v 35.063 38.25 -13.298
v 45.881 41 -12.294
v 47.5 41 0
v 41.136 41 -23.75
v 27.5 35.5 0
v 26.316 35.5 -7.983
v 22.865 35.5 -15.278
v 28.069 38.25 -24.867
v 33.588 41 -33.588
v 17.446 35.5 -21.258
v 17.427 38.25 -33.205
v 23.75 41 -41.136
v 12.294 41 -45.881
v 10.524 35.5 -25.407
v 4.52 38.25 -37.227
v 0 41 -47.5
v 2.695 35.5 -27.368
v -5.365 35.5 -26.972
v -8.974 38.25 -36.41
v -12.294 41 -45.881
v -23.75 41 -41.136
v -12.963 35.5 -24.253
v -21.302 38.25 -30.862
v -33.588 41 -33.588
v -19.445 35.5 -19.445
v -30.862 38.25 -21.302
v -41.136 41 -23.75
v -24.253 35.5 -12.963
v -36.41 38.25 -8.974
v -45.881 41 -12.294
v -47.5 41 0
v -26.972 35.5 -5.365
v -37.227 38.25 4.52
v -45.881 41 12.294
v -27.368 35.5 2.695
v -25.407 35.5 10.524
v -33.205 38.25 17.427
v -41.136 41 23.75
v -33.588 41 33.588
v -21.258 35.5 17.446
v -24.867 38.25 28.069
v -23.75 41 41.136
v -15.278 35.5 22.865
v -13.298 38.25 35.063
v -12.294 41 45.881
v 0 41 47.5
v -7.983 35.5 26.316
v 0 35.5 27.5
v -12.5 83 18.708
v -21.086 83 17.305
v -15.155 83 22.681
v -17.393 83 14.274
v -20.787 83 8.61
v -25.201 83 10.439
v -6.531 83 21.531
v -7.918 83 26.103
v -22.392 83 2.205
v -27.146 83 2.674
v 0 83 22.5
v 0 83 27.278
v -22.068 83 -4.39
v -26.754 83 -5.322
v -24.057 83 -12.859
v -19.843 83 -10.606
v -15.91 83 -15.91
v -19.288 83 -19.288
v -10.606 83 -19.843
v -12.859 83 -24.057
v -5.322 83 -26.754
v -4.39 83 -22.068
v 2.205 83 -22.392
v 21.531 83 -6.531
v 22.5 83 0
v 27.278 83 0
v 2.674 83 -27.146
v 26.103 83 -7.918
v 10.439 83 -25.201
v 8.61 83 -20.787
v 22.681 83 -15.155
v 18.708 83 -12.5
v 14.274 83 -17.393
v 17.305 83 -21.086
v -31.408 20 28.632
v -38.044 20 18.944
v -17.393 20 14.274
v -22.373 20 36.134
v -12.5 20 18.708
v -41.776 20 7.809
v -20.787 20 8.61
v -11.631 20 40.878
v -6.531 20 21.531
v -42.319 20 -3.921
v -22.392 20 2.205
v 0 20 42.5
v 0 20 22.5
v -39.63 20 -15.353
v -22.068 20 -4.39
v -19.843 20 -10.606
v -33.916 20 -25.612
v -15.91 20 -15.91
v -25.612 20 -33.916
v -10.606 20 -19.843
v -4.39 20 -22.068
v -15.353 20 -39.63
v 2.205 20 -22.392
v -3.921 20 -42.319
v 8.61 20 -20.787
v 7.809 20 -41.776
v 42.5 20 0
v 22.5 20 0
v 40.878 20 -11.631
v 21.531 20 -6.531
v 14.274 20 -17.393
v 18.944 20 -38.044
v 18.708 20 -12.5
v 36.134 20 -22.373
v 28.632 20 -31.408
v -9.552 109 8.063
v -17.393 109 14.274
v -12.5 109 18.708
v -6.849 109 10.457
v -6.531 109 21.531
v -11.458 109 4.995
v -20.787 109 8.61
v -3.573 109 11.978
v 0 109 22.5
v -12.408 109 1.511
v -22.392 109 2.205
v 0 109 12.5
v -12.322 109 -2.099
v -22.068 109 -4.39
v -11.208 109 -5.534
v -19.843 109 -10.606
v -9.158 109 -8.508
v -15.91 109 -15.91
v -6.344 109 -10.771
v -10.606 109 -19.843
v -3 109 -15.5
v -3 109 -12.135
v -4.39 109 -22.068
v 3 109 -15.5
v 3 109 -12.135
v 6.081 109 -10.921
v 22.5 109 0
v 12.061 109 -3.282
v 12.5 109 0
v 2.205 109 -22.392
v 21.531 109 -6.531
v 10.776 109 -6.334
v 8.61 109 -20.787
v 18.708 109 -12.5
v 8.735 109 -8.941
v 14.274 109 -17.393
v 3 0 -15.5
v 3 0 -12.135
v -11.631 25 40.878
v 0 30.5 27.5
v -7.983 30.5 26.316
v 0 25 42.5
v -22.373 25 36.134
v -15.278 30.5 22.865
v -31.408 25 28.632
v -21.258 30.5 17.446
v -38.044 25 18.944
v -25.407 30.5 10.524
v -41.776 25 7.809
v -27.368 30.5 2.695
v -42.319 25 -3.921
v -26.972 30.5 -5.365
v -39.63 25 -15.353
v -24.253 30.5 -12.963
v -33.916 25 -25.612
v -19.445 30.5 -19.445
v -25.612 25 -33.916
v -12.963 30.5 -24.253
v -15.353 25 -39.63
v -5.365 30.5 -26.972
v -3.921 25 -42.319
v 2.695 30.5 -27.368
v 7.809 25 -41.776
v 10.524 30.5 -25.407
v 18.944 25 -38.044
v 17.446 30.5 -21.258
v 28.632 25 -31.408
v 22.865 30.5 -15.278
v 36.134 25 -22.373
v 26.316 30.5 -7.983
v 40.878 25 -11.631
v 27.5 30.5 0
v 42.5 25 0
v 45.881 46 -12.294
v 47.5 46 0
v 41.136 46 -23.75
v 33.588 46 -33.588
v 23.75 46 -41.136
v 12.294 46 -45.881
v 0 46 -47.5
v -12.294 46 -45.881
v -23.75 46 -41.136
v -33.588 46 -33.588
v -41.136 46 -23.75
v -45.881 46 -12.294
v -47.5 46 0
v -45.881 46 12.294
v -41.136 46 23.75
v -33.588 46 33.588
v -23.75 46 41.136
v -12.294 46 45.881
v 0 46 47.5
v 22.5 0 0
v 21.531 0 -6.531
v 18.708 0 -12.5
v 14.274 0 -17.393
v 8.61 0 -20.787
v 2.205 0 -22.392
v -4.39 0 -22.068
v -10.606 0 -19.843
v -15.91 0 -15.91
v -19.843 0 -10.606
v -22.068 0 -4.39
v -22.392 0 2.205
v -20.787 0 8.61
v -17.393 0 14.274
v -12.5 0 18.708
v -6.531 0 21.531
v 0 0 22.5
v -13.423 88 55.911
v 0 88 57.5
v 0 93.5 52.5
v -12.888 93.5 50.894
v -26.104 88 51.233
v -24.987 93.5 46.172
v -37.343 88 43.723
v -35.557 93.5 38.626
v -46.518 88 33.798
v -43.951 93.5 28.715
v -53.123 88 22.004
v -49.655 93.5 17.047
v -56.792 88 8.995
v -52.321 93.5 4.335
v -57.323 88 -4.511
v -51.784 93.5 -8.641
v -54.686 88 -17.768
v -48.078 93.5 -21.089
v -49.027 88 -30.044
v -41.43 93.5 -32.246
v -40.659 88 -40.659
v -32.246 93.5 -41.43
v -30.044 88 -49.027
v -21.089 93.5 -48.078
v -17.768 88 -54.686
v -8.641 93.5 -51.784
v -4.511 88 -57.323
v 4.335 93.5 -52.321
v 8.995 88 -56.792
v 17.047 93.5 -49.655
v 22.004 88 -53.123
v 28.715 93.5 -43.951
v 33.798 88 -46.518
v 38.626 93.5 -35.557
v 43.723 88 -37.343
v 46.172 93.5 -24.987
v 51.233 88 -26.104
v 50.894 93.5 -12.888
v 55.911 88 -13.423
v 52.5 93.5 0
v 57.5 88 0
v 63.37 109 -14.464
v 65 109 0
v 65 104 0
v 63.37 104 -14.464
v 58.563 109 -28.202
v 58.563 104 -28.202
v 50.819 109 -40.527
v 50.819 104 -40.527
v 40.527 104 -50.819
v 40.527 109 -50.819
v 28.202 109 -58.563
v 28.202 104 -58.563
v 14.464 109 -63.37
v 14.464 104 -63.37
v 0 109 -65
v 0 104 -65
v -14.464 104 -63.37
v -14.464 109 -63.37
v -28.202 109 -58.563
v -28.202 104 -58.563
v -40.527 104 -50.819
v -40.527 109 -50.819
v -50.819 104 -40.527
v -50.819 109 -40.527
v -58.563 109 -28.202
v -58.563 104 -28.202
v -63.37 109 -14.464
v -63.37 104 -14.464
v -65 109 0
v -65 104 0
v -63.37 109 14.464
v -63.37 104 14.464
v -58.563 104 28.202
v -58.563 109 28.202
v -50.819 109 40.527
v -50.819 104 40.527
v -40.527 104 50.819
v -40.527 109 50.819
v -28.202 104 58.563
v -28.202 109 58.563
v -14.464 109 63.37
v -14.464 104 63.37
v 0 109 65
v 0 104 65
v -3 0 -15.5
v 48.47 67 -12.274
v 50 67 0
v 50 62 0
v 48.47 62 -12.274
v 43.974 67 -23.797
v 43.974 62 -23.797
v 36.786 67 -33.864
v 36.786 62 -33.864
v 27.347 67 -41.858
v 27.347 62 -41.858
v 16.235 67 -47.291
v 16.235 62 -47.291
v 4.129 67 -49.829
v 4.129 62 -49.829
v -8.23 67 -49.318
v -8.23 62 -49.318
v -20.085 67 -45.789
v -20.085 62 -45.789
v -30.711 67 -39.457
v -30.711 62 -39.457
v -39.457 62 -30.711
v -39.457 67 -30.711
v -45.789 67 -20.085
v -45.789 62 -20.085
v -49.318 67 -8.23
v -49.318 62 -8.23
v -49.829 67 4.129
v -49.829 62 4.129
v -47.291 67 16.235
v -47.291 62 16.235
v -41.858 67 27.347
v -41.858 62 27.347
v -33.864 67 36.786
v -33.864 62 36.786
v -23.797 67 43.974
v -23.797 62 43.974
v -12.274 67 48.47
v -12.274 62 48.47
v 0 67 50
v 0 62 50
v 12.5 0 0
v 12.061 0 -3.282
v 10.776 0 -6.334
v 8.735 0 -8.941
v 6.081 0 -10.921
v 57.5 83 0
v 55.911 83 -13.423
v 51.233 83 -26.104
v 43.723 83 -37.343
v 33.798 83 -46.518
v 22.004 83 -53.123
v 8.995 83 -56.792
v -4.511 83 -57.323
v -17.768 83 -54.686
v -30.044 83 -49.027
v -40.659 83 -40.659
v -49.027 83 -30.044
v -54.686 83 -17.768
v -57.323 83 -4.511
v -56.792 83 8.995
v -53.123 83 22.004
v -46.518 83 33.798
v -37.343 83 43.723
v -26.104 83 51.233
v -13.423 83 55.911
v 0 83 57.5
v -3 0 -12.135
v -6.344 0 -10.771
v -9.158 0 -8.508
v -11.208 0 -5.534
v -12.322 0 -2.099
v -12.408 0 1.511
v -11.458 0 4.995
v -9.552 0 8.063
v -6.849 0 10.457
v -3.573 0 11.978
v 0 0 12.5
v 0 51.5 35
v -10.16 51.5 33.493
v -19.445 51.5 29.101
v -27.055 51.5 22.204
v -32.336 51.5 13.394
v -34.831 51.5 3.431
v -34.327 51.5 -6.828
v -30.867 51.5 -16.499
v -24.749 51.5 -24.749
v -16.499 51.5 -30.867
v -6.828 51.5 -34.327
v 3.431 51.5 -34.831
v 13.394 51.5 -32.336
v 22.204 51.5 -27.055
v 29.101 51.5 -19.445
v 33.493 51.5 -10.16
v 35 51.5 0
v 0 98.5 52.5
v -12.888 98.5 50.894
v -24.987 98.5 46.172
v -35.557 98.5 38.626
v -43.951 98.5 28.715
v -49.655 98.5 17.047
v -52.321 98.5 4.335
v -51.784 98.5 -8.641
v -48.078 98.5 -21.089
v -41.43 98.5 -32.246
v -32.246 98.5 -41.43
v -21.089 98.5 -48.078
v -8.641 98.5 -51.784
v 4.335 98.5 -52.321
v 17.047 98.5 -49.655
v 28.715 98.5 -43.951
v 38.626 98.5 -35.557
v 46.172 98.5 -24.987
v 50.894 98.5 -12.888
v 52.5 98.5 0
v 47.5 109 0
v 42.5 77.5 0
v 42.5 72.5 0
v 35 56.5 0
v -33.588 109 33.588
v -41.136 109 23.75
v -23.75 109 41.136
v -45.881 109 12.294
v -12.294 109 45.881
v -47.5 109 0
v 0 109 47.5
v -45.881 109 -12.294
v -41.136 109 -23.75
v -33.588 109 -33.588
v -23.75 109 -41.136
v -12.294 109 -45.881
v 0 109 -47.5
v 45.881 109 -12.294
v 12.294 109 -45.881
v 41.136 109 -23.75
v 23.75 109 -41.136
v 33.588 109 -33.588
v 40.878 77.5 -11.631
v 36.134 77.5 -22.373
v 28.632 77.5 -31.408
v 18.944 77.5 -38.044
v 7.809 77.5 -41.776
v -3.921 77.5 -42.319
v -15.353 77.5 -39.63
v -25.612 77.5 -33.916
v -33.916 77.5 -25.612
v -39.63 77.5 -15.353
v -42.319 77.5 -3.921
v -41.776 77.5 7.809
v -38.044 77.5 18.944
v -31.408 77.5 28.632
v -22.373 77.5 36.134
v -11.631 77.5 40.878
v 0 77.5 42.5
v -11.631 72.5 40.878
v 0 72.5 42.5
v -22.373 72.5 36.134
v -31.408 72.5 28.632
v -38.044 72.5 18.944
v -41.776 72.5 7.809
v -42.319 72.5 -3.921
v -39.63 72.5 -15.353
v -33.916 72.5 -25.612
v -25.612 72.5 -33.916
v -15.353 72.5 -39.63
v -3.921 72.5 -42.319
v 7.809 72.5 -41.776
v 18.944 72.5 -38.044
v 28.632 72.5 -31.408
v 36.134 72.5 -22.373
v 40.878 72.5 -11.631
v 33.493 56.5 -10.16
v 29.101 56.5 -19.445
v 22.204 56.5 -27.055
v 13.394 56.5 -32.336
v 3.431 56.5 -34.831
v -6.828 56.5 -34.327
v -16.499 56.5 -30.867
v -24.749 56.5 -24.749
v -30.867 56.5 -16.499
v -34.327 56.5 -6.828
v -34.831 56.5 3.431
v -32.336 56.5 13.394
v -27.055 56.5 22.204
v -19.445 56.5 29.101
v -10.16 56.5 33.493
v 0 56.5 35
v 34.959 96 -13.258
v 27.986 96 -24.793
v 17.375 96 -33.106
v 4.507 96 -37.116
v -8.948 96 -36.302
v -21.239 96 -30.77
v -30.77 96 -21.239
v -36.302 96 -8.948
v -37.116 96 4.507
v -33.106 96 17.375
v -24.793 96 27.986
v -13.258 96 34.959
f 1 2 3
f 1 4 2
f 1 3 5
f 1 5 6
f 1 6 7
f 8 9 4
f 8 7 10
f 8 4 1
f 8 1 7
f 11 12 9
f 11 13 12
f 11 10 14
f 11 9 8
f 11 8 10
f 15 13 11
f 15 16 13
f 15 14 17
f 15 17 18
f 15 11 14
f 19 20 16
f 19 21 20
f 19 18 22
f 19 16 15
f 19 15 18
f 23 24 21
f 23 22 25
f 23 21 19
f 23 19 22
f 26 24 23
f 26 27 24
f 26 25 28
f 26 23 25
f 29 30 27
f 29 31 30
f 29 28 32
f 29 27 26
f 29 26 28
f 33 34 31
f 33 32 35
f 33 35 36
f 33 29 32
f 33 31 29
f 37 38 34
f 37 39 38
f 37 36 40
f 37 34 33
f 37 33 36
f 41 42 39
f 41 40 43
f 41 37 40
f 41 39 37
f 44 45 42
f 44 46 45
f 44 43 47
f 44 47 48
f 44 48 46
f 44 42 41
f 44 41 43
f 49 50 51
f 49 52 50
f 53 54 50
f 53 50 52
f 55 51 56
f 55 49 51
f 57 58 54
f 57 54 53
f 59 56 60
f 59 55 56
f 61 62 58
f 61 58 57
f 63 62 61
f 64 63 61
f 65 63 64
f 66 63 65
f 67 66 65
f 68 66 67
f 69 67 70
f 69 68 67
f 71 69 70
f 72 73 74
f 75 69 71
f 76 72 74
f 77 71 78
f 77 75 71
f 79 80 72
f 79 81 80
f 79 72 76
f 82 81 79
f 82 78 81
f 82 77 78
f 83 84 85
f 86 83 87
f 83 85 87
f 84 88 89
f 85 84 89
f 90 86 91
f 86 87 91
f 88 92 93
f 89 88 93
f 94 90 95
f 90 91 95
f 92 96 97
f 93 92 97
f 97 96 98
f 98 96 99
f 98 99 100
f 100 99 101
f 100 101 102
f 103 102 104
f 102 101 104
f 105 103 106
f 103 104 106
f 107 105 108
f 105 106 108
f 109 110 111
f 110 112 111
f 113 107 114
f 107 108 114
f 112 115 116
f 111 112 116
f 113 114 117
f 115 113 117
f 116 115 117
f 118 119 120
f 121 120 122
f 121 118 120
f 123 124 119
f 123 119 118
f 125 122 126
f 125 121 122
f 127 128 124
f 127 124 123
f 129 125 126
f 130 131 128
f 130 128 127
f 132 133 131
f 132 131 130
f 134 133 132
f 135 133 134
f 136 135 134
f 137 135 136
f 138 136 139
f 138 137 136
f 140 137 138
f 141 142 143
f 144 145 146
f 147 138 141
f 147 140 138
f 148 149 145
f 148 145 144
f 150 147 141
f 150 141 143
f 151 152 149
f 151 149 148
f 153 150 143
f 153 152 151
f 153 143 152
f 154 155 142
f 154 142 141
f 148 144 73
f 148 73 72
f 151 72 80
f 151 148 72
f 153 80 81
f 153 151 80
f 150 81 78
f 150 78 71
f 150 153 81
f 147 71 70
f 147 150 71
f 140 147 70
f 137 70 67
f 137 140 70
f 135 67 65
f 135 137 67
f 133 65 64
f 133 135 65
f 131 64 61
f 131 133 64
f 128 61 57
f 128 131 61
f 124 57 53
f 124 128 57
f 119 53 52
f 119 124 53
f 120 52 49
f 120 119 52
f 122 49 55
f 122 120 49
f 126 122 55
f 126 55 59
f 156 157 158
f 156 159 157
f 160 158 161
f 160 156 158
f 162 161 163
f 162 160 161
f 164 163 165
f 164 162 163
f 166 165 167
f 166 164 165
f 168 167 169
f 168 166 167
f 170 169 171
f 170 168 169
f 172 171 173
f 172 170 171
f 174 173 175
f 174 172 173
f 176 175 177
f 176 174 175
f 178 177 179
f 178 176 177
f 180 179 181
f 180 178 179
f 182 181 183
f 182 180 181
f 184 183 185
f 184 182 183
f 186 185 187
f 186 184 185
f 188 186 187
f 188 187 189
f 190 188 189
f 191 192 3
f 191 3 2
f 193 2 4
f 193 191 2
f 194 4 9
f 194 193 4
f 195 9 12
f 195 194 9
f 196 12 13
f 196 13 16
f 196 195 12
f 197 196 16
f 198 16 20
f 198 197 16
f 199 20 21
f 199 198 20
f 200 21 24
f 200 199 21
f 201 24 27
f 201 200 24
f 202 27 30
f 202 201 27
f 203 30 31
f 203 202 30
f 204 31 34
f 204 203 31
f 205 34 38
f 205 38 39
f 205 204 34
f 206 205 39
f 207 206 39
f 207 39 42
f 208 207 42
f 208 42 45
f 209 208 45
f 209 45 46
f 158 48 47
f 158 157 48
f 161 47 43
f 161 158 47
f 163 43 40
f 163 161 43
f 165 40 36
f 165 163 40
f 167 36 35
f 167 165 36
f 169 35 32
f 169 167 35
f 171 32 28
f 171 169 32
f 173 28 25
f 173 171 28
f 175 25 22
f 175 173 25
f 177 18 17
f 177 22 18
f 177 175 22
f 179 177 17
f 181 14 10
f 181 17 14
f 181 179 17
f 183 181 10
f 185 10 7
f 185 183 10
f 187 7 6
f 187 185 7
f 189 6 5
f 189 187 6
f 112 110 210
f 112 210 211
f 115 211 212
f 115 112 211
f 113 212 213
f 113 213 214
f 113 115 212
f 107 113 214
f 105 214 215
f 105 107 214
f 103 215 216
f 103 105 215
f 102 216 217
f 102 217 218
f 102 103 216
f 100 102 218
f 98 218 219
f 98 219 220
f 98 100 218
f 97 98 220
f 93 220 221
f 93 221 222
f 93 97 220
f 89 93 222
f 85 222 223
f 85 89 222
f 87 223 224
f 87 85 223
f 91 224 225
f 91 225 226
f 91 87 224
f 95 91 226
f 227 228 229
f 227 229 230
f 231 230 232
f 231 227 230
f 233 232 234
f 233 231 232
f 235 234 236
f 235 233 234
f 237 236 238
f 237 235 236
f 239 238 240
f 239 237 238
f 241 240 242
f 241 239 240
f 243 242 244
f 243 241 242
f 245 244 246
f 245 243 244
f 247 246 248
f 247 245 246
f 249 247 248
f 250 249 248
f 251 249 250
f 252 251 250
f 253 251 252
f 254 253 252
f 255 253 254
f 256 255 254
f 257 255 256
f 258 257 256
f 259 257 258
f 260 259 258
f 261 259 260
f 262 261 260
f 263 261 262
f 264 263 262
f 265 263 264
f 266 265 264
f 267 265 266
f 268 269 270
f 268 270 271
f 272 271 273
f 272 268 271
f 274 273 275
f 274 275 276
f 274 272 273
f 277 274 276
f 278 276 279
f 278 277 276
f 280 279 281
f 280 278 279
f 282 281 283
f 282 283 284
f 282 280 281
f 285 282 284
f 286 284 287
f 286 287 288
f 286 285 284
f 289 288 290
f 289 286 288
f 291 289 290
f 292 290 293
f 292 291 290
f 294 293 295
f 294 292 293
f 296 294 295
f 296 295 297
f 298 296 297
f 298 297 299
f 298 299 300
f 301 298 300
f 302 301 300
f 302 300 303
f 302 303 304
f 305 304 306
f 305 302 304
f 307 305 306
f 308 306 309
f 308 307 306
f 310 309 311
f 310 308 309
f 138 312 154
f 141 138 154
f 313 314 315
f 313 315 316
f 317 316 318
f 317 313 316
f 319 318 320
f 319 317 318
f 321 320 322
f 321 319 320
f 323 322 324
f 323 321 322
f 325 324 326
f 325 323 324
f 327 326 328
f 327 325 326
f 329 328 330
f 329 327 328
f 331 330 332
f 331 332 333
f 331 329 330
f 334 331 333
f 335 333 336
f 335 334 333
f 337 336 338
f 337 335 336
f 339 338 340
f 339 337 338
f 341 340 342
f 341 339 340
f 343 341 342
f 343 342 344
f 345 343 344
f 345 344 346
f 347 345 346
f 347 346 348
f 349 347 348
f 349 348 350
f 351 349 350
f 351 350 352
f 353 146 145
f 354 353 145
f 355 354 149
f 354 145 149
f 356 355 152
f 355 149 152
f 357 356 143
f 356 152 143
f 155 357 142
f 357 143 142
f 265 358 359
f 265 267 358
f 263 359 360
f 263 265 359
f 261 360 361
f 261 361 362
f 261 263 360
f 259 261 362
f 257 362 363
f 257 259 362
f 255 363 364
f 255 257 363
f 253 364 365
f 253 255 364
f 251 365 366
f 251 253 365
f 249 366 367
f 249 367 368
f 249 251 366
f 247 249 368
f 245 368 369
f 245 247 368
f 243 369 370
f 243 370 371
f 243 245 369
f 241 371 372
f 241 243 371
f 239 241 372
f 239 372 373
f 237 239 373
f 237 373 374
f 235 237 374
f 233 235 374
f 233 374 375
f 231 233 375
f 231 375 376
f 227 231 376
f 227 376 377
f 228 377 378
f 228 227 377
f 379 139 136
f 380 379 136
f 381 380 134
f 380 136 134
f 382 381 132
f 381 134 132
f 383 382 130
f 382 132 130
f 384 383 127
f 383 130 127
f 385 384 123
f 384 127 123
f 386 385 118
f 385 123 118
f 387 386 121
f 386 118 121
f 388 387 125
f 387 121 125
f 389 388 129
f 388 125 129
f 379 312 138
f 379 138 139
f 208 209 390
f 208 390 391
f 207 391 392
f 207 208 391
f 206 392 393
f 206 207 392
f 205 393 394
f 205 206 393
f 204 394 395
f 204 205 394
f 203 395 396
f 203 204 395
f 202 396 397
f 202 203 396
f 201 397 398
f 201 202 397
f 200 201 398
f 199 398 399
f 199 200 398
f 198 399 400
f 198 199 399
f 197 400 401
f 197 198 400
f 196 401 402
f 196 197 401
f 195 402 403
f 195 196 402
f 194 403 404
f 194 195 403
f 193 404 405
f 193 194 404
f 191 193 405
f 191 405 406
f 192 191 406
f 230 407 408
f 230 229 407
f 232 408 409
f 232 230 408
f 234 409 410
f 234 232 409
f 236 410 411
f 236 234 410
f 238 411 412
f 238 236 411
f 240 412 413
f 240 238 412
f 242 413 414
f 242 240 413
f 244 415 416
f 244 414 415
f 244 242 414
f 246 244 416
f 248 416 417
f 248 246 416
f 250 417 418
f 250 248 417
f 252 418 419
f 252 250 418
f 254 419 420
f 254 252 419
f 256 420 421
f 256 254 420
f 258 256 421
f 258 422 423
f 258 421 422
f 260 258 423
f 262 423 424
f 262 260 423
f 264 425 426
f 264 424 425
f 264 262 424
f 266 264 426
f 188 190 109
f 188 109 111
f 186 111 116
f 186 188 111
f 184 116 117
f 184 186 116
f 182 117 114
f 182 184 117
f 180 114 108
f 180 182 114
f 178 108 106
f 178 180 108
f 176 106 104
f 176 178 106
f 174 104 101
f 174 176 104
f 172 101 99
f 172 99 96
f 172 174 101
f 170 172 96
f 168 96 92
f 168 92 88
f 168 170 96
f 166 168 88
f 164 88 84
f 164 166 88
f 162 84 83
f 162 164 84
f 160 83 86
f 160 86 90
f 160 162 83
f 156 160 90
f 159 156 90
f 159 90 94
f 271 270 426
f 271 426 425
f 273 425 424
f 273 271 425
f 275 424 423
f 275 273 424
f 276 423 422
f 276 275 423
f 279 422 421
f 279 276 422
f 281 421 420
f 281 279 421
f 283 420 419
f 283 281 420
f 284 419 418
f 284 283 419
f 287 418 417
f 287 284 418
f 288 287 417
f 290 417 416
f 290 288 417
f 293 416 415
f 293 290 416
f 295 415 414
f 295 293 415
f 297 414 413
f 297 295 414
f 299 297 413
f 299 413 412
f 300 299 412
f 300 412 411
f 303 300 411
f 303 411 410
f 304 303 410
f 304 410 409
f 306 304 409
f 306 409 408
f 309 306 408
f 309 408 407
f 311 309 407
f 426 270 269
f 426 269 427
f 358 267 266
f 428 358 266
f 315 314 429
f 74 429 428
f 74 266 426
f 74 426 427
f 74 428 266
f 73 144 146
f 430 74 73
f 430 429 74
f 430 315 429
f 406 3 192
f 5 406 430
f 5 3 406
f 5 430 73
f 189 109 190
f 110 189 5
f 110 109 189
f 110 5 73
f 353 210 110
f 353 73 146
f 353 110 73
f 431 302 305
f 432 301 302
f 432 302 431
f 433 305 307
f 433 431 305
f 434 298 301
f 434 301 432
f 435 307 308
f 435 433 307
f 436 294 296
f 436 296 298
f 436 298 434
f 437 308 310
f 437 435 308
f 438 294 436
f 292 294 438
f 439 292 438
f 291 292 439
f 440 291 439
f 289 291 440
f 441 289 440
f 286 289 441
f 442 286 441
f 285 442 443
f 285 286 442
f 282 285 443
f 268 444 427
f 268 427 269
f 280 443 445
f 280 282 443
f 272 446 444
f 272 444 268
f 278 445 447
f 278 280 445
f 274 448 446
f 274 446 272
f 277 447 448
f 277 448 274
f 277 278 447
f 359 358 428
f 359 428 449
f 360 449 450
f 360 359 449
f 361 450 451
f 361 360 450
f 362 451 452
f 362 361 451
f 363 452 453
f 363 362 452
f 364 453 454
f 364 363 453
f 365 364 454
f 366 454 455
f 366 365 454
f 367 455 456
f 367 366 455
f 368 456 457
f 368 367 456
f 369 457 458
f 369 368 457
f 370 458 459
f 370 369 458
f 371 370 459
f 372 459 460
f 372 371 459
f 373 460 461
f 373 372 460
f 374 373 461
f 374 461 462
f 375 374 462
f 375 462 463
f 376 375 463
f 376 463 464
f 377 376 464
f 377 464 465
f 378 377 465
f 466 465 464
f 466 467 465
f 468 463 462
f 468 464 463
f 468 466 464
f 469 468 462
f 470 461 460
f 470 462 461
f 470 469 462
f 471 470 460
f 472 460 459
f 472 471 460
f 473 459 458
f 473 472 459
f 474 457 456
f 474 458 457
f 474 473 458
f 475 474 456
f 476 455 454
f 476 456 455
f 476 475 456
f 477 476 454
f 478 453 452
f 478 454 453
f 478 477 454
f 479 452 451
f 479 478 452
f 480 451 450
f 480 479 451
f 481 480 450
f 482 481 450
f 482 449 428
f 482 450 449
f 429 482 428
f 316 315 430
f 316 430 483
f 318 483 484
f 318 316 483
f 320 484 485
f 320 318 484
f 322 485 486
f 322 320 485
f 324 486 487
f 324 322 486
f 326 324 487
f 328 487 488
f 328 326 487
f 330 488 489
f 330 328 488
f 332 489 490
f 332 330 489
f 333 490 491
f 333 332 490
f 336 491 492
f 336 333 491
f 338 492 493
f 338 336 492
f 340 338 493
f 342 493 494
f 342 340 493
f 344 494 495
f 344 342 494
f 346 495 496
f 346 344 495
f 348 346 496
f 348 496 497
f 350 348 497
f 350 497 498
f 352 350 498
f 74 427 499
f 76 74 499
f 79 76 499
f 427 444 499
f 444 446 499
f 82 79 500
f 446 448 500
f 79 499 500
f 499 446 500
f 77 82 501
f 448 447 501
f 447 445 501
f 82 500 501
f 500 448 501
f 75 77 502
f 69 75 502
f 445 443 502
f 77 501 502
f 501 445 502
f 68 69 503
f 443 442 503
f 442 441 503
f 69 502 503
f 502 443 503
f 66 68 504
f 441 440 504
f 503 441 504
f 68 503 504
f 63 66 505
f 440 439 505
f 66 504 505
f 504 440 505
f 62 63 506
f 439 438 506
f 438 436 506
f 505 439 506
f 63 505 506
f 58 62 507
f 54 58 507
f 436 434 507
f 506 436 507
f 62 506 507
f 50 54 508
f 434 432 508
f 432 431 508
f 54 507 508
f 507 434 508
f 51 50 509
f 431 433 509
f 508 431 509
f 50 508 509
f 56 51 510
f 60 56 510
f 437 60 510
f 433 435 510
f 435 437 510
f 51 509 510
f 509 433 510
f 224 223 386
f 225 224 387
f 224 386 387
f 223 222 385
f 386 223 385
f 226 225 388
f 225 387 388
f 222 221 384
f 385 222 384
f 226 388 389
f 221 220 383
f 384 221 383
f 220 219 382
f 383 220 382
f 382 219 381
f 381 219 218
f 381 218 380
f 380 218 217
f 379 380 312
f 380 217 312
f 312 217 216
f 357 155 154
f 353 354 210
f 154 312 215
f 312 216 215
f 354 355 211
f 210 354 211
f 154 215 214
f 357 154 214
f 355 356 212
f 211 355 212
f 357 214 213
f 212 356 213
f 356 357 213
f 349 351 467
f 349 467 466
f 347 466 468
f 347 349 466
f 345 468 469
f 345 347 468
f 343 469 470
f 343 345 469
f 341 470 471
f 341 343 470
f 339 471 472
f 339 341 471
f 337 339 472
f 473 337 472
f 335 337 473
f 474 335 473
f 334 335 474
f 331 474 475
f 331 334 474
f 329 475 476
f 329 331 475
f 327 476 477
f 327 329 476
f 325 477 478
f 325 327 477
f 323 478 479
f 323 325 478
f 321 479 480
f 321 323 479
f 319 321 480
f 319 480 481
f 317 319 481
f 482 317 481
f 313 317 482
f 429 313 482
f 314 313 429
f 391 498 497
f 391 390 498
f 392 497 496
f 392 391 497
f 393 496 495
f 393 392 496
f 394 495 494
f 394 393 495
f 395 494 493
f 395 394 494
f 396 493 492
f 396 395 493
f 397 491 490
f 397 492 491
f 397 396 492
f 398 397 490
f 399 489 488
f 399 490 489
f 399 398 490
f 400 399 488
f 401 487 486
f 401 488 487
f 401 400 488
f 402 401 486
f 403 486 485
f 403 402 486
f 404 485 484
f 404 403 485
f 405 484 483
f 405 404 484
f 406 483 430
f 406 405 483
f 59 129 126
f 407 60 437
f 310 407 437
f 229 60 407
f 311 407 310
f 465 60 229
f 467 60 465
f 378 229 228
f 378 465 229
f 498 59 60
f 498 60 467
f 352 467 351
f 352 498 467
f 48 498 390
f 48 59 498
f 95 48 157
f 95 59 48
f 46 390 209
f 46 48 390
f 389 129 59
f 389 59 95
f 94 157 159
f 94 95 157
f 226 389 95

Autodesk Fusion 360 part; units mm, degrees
sketch "Sketch1" plane through (0, 0, 0) normal (0, 0, 1) x (1, 0, 0)
  line L0 (12.5, 0) -> (22.5, 0)
  line L1 (12.5, 0) -> (12.5, 20)
  line L2 (22.5, 0) -> (22.5, 20)
  line L3 (22.5, 20) -> (42.5, 20)
  line L4 (42.5, 20) -> (42.5, 25)
  line L5 (42.5, 25) -> (22.5, 25)
  line L6 (0, 0) -> (0, 115)
  line L7 (0, 25) -> (0, 41)
  line L8 (22.5, 41) -> (47.5, 41)
  line L9 (47.5, 41) -> (47.5, 46)
  line L10 (47.5, 46) -> (22.5, 46)
  line L11 (0, 46) -> (0, 62)
  line L12 (22.5, 62) -> (50, 62)
  line L13 (50, 62) -> (50, 67)
  line L14 (50, 67) -> (22.5, 67)
  line L15 (0, 67) -> (0, 83)
  line L16 (57.5, 83) -> (57.5, 88)
  line L17 (0, 88) -> (0, 104)
  line L18 (65, 104) -> (65, 109)
  line L19 (52.5, 98.5) -> (52.5, 93.5)
  line L20 (65, 104) -> (52.5, 98.5)
  line L21 (52.5, 93.5) -> (57.5, 88)
  line L22 (12.5, 20) -> (12.5, 109)
  line L23 (22.5, 20) -> (22.5, 109)
  line L24 (0, 83) -> (0, 77.5)
  line L25 (23, 77.5) -> (42.5, 77.5)
  line L26 (42.5, 77.5) -> (42.5, 72.5)
  line L27 (42.5, 72.5) -> (22.5, 72.5041)
  line L28 (42.5, 77.5) -> (57.5, 83)
  line L29 (42.5, 72.5) -> (50, 67)
  line L30 (0, 62) -> (0, 56.5)
  line L31 (22.5, 56.5) -> (35, 56.5)
  line L32 (35, 56.5) -> (35, 51.5)
  line L33 (35, 56.5) -> (50, 62)
  line L34 (35, 51.5) -> (47.5, 46)
  line L35 (0, 41) -> (0, 35.5)
  line L36 (22.5, 35.5) -> (27.5, 35.5)
  line L37 (27.5, 35.5) -> (27.5, 30.5)
  line L38 (47.5, 41) -> (27.5, 35.5)
  line L39 (27.5, 30.5) -> (42.5, 25)
  line L40 (0, 93.5) -> (-0.0024, 93.5)
  line L41 (35, 51.5) -> (22.5, 51.5)
  line L42 (0, 51.5) -> (-0.0011, 51.5)
  line L43 (27.5, 30.5) -> (22.5, 30.5)
  line L44 (0, 30.5) -> (-0.1134, 30.5)
  line L45 (12.5, 109) -> (12.5, 64)
  line L46 (22.5, 76.8571) -> (47.5, 109)
  line L47 (43.6111, 104) -> (65, 104)
  line L48 (39.3333, 98.5) -> (52.5, 98.5)
  line L49 (52.5, 93.5) -> (35.4444, 93.5)
  line L50 (57.5, 88) -> (31.1667, 88)
  line L51 (27.2778, 83) -> (57.5, 83)
  line L52 (65, 109) -> (47.5, 109)
  line L53 (22.5, 109) -> (12.5, 109)
  line L54 (27.2778, 83) -> (22.5, 83)
  dimension "d1" = 12.5
  dimension "d2" = 22.5
  dimension "d3" = 20
  dimension "d6" = 5
  dimension "d7" = 115
  dimension "d8" = 16
  dimension "d9" = 47.5
  dimension "d10" = 5
  dimension "d11" = 16
  dimension "d12" = 50
  dimension "d13" = 5
  dimension "d14" = 16
  dimension "d15" = 57.5
  dimension "d16" = 5
  dimension "d17" = 16
  dimension "d18" = 65
  dimension "d19" = 5
  dimension "d24" = 5
  dimension "d25" = 90
  dimension "d26" = 5.5
  dimension "d27" = 42.5
  dimension "d28" = 5
  dimension "d29" = 5.5
  dimension "d30" = 35
  dimension "d31" = 5
  dimension "d32" = 90
  dimension "d33" = 5.5
  dimension "d34" = 27.5
  dimension "d35" = 5
  dimension "d36" = 90
  dimension "d37" = 45
  dimension "d38" = 25
revolve "Revolve1" add sketch "Sketch1" angle 360 about axis through (0, 0, 0) along (0, 1, 0)
sketch "Sketch2" plane through (0, 0, 0) normal (0, 1, 0) x (1, 0, 0)
  line L0 (0, 12.5) -> (0, 15.5)
  line L1 (0, 15.5) -> (3, 15.5)
  line L2 (3, 15.5) -> (-3, 15.5)
  line L3 (-3, 15.5) -> (-3, 12)
  line L4 (-3, 12) -> (3, 12)
  line L5 (3, 12) -> (3, 15.5)
  dimension "d40" = 3
  dimension "d41" = 6
extrude "Extrude1" cut sketch "Sketch2" along normal blind 115
sketch "Sketch3" plane through (0, 0, 0) normal (0, 1, 0) x (1, 0, 0)
  line L0 (0, -90) -> (100, -90)
  line L1 (100, -90) -> (100, 0)
  line L2 (100, 0) -> (0, 0)
  line L3 (0, 0) -> (0, -90)
extrude "Extrude2" cut sketch "Sketch3" along normal blind 115
